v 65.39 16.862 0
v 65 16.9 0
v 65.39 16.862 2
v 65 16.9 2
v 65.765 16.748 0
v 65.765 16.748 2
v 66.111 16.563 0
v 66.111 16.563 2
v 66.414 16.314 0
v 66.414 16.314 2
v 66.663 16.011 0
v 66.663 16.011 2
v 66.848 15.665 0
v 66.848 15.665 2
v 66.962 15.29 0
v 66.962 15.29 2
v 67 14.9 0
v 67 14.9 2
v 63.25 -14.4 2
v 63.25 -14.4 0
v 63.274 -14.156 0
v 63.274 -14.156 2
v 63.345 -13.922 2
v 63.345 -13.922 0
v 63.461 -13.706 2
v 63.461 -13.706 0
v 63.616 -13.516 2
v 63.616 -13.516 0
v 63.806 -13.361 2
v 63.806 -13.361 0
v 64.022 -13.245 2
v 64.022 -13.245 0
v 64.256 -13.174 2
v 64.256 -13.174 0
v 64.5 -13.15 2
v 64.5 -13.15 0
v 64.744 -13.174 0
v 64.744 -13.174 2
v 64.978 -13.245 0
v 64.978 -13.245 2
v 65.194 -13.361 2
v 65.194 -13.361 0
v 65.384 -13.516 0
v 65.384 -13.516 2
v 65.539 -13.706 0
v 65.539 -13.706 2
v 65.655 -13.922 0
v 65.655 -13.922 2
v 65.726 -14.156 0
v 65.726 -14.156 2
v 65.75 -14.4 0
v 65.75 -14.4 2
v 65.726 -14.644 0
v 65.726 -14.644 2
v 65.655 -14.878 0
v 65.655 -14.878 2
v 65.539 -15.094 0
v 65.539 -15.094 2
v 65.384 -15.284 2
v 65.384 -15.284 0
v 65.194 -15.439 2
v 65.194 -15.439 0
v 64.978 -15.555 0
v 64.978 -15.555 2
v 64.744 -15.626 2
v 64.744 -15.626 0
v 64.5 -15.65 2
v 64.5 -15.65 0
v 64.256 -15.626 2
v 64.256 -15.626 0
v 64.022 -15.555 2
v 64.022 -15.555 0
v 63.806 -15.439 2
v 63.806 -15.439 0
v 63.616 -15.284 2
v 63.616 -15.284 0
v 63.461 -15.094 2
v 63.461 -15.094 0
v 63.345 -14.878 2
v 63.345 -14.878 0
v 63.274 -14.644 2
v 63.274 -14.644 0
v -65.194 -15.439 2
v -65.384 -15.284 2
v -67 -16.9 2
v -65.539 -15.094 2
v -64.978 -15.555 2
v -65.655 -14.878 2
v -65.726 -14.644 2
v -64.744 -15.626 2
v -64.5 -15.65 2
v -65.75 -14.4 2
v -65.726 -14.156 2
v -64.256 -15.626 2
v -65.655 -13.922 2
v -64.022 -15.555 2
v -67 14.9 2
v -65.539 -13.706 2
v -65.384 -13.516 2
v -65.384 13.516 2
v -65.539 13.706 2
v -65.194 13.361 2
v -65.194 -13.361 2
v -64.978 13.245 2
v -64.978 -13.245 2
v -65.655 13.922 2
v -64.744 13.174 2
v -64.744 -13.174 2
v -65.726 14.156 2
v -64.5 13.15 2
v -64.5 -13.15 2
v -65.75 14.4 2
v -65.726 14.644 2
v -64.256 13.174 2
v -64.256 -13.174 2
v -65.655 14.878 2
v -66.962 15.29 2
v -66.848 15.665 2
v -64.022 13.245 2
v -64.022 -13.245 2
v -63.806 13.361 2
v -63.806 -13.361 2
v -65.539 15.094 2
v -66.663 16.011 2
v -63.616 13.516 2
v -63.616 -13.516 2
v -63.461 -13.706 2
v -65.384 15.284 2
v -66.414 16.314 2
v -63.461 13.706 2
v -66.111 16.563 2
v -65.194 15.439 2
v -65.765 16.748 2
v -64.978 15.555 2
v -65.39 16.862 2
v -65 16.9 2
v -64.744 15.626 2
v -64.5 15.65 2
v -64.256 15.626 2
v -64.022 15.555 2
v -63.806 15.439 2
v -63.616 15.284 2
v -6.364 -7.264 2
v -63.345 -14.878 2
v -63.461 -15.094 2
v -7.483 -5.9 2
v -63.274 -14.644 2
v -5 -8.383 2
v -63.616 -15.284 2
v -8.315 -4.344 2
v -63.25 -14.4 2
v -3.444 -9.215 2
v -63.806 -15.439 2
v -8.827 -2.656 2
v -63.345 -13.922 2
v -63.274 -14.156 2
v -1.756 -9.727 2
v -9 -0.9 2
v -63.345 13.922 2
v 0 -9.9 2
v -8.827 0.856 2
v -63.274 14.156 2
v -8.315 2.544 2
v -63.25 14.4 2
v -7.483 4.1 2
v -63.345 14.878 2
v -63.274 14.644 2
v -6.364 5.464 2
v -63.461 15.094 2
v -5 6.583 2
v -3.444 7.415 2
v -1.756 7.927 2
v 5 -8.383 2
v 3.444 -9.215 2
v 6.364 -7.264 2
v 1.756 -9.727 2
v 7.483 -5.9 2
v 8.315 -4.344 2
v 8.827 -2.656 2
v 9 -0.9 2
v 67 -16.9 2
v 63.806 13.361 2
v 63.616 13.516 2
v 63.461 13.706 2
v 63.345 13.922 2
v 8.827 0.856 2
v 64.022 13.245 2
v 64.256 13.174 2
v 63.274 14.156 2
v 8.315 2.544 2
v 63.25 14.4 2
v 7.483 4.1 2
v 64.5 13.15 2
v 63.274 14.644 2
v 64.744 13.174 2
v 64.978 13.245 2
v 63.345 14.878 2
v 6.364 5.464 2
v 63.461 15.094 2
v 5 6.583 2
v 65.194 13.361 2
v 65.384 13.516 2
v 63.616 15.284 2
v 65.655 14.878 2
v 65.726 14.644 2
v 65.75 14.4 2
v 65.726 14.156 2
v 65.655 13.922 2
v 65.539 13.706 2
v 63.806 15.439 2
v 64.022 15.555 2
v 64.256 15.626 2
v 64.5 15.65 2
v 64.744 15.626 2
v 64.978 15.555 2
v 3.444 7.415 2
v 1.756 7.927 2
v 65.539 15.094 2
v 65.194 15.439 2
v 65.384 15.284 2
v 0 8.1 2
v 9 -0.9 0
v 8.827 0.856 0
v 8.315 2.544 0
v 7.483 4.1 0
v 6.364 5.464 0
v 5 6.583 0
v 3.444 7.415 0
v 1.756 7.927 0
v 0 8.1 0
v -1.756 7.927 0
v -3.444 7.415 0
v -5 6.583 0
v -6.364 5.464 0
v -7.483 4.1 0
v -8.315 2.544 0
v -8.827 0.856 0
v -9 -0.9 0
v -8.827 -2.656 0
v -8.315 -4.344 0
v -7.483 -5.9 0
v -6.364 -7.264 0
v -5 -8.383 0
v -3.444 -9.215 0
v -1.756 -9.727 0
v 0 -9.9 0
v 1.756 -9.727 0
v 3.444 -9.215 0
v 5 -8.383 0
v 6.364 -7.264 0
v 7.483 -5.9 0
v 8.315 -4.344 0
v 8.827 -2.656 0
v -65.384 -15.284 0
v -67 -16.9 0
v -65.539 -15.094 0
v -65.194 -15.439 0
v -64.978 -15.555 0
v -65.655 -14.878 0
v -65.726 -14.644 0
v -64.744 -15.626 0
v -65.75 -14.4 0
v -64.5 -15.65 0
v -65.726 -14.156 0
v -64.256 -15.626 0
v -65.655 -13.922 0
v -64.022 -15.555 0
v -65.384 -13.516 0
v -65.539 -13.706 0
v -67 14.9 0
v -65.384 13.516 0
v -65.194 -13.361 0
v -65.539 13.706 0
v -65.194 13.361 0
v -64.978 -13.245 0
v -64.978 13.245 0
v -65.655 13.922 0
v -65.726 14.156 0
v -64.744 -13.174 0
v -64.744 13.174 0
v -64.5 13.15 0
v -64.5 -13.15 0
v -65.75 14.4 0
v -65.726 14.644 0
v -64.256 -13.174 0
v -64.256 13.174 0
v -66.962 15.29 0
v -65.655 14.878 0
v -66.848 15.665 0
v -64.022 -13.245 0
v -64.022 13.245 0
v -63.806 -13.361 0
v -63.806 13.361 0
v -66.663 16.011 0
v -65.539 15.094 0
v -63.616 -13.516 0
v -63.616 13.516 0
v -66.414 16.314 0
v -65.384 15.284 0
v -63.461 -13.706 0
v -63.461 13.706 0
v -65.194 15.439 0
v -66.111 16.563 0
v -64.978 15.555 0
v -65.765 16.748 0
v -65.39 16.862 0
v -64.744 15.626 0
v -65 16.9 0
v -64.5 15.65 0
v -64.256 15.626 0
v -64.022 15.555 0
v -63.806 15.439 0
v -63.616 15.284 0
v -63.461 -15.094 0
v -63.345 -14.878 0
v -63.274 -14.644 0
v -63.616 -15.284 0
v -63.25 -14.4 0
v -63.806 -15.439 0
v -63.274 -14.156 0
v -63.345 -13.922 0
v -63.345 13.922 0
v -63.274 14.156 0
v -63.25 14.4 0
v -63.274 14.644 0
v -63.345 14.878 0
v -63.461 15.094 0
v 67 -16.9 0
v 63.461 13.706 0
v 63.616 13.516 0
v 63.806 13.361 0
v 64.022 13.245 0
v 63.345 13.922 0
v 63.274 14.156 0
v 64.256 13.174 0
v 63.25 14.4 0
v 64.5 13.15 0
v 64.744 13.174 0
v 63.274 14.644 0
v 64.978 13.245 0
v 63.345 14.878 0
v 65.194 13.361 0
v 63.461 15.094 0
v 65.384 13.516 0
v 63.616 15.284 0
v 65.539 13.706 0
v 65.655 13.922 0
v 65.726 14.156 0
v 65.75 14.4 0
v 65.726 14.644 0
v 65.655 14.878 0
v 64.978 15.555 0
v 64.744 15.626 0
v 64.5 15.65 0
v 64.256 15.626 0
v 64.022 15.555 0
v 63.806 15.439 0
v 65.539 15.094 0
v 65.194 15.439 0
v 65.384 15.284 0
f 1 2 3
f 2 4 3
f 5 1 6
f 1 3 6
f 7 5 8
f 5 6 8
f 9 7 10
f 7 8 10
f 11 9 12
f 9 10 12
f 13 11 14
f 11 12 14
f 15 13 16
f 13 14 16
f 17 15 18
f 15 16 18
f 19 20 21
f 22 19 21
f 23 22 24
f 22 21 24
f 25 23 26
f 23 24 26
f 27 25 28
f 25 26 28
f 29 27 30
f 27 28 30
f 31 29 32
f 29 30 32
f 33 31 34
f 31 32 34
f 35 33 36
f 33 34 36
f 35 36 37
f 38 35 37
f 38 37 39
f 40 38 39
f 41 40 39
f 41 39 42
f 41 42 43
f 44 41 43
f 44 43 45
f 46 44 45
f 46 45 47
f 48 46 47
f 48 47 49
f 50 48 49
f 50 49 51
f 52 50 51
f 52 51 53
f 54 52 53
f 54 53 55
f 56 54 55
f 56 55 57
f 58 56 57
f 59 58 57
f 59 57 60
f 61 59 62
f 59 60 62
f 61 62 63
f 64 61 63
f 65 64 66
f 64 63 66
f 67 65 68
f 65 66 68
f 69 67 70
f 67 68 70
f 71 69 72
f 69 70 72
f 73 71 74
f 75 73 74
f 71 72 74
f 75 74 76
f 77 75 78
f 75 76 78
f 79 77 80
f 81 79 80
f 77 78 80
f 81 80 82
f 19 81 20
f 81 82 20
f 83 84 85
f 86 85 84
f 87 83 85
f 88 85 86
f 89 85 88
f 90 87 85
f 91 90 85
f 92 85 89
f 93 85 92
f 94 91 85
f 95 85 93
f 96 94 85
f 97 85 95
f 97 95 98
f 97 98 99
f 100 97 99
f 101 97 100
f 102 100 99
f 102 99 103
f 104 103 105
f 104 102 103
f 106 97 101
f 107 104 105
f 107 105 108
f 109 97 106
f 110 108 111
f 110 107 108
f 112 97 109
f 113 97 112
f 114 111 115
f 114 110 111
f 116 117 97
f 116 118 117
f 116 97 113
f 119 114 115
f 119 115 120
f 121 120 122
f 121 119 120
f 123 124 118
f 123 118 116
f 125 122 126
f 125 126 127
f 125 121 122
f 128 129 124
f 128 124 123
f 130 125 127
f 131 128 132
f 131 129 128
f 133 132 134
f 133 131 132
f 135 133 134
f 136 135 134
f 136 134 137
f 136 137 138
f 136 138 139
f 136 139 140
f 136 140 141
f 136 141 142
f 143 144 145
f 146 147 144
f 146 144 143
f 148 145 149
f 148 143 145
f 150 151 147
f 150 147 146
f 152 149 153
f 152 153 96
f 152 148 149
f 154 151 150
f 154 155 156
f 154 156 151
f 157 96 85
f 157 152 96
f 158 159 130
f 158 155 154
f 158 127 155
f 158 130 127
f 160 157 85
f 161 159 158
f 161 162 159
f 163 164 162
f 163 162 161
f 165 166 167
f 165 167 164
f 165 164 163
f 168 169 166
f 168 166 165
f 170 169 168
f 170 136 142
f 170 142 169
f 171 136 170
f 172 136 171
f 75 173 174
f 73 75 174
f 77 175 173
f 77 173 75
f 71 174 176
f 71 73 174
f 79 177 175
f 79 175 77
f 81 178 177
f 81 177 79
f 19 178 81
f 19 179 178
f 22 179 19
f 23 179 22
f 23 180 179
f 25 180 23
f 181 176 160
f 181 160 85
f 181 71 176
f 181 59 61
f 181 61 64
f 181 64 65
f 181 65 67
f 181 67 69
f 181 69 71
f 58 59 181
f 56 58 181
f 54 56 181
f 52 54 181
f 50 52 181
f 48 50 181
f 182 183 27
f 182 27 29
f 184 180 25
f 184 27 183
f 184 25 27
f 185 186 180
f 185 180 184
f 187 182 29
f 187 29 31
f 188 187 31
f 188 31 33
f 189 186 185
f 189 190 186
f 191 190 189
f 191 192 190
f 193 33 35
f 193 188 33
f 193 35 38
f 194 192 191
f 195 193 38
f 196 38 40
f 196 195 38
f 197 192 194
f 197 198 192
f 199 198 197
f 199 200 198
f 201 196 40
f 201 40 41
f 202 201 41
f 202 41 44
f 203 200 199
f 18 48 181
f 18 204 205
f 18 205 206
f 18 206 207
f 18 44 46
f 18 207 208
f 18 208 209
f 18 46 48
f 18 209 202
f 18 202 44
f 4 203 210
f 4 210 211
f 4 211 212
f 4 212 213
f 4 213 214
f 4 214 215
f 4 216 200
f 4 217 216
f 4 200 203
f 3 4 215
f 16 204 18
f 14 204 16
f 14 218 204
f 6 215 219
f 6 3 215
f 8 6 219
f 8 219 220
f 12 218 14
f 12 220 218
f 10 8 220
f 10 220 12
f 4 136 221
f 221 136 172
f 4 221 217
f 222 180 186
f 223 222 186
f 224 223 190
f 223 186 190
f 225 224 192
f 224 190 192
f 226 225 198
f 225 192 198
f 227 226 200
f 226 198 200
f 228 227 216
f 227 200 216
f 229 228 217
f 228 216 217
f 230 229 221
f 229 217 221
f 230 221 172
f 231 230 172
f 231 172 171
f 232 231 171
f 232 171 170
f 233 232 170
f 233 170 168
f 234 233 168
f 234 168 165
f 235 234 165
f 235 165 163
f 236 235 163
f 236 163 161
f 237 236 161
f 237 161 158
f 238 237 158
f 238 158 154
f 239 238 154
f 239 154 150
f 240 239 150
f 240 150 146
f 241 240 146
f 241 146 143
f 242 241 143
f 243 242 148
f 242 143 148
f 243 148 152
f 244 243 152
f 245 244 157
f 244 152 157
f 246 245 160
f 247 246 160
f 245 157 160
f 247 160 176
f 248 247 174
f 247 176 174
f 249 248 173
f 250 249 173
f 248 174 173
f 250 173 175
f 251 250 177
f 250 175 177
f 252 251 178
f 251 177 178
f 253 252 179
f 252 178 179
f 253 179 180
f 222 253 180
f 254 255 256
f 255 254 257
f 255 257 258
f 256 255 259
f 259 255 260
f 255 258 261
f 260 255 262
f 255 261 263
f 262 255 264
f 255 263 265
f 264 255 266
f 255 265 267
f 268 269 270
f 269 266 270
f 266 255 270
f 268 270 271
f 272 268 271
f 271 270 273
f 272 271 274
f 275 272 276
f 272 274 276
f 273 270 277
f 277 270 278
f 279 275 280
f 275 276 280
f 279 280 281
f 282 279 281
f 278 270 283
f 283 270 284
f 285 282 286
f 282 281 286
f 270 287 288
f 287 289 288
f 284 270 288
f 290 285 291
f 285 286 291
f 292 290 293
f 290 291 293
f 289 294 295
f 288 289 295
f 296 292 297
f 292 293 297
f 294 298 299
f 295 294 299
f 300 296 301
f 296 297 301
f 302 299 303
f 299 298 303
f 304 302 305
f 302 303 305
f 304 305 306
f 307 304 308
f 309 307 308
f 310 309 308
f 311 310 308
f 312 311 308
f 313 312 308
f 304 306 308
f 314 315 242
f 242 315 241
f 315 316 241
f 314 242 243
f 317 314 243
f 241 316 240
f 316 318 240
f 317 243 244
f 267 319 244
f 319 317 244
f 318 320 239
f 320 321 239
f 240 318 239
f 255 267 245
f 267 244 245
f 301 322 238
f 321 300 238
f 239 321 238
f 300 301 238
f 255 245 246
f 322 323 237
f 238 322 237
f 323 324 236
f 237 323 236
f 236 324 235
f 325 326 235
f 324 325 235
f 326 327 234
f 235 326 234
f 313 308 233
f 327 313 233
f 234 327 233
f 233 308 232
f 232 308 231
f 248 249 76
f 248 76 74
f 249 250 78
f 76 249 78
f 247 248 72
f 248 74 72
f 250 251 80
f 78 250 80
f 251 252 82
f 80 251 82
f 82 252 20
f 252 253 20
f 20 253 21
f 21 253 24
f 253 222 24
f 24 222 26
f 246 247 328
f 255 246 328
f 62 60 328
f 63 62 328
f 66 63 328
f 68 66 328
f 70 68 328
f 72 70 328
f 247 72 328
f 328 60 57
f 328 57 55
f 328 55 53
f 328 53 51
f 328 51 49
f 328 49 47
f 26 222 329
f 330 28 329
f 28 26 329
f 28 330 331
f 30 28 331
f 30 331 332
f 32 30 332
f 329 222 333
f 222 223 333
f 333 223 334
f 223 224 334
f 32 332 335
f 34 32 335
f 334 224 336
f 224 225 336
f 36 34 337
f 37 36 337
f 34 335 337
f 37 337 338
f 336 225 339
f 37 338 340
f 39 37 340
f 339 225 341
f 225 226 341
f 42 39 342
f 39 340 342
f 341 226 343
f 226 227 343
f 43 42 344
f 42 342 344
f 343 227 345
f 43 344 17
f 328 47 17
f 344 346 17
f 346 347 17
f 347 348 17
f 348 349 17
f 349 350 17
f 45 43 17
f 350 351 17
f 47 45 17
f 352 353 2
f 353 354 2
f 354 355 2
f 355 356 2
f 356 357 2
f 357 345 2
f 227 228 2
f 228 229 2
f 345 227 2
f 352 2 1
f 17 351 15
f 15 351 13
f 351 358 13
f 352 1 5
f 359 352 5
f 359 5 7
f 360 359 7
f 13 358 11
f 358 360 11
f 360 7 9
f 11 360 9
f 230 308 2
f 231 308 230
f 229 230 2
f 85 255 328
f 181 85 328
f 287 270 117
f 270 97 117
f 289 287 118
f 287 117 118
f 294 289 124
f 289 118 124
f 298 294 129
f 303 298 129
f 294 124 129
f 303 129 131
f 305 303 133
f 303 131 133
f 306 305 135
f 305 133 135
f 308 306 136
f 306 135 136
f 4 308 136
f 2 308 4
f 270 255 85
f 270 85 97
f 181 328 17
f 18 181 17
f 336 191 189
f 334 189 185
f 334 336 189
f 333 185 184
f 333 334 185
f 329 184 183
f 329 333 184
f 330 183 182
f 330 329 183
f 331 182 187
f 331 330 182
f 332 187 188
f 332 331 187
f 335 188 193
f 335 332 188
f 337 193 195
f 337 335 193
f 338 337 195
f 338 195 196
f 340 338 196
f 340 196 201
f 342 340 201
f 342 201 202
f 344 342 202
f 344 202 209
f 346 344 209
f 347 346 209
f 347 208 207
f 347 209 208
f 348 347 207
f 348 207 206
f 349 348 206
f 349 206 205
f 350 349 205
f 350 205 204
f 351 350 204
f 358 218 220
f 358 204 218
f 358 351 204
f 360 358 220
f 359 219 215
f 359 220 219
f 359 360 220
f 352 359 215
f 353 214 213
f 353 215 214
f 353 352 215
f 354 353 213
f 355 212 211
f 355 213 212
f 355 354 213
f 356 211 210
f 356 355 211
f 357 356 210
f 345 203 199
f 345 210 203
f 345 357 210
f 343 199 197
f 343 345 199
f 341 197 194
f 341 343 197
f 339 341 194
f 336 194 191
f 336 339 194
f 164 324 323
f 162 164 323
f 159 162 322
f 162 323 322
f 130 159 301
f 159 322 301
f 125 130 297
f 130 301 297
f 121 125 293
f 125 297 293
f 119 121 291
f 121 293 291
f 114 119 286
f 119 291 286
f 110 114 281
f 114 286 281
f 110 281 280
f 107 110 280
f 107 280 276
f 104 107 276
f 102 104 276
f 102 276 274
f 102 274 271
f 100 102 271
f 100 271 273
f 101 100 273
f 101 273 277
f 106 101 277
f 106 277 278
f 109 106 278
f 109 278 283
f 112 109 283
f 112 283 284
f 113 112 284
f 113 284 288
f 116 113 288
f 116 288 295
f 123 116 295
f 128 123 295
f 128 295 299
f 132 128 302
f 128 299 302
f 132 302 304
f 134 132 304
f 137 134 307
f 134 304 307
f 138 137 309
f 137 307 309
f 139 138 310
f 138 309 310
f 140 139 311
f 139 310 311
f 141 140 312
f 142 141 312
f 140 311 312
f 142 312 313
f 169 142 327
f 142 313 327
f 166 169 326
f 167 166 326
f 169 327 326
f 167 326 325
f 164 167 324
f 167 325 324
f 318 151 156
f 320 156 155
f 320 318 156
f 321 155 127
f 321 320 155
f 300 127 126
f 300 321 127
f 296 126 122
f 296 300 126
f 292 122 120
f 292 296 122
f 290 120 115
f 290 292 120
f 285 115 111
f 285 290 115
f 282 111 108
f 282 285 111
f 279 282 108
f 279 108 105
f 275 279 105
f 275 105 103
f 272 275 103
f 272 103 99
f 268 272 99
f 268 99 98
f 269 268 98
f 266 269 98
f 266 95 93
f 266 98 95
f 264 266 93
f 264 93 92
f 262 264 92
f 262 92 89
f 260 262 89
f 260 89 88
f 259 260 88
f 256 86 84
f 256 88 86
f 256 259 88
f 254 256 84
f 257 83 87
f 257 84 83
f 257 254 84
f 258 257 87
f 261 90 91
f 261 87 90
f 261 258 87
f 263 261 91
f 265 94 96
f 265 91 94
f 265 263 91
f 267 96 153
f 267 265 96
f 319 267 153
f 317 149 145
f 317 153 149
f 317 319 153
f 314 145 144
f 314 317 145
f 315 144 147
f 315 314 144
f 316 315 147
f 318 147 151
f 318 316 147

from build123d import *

# Parameters (mm, degrees)
SKETCH_W           = 134
SKETCH_H           = 33.8
PAD_DEPTH          = 2
SKETCH001_R        = 9
POCKET_DEPTH       = 2.001
FILLET_R           = 2
SKETCH002_R        = 1.25
POCKET001_DEPTH    = 278.424154
POLARPATTERN_COUNT = 2


with BuildPart() as part:
    # Sketch → Pad (new body)
    with BuildSketch(Plane.XY):
        Rectangle(SKETCH_W, SKETCH_H)
    extrude(amount=PAD_DEPTH)

    # Sketch001 (on Face6 of Pad) → Pocket (cut, through all)
    with BuildSketch(Plane.XY.offset(2)):
        with Locations((0, -0.9)):
            Circle(SKETCH001_R)
    extrude(amount=-POCKET_DEPTH, mode=Mode.SUBTRACT)

    # Fillet
    fillet_edges = [part.edges().sort_by_distance(p)[0] for p in [
        (-67, 16.9, 1),
        (67, 16.9, 1),
    ]]
    fillet(fillet_edges, radius=FILLET_R)

    # Sketch002 → Pocket001 (cut, through all)
    with BuildSketch(Plane.XY):
        with Locations((-64.5, -14.4)):
            Circle(SKETCH002_R)
    pocket001 = extrude(amount=POCKET001_DEPTH, mode=Mode.SUBTRACT)

    # Mirrored: Pocket001 across YZ
    add(pocket001.mirror(Plane.YZ), mode=Mode.SUBTRACT)

    # Mirrored001: Pocket001 across XZ
    add(pocket001.mirror(Plane.XZ), mode=Mode.SUBTRACT)

    # PolarPattern: Pocket001 ×2 about axis
    polarpattern_axis = Axis((0, 0, 0), (0, 0, 1))
    for i in range(1, POLARPATTERN_COUNT):
        add(pocket001.rotate(polarpattern_axis, i * 360 / POLARPATTERN_COUNT), mode=Mode.SUBTRACT)


solid = part.part
